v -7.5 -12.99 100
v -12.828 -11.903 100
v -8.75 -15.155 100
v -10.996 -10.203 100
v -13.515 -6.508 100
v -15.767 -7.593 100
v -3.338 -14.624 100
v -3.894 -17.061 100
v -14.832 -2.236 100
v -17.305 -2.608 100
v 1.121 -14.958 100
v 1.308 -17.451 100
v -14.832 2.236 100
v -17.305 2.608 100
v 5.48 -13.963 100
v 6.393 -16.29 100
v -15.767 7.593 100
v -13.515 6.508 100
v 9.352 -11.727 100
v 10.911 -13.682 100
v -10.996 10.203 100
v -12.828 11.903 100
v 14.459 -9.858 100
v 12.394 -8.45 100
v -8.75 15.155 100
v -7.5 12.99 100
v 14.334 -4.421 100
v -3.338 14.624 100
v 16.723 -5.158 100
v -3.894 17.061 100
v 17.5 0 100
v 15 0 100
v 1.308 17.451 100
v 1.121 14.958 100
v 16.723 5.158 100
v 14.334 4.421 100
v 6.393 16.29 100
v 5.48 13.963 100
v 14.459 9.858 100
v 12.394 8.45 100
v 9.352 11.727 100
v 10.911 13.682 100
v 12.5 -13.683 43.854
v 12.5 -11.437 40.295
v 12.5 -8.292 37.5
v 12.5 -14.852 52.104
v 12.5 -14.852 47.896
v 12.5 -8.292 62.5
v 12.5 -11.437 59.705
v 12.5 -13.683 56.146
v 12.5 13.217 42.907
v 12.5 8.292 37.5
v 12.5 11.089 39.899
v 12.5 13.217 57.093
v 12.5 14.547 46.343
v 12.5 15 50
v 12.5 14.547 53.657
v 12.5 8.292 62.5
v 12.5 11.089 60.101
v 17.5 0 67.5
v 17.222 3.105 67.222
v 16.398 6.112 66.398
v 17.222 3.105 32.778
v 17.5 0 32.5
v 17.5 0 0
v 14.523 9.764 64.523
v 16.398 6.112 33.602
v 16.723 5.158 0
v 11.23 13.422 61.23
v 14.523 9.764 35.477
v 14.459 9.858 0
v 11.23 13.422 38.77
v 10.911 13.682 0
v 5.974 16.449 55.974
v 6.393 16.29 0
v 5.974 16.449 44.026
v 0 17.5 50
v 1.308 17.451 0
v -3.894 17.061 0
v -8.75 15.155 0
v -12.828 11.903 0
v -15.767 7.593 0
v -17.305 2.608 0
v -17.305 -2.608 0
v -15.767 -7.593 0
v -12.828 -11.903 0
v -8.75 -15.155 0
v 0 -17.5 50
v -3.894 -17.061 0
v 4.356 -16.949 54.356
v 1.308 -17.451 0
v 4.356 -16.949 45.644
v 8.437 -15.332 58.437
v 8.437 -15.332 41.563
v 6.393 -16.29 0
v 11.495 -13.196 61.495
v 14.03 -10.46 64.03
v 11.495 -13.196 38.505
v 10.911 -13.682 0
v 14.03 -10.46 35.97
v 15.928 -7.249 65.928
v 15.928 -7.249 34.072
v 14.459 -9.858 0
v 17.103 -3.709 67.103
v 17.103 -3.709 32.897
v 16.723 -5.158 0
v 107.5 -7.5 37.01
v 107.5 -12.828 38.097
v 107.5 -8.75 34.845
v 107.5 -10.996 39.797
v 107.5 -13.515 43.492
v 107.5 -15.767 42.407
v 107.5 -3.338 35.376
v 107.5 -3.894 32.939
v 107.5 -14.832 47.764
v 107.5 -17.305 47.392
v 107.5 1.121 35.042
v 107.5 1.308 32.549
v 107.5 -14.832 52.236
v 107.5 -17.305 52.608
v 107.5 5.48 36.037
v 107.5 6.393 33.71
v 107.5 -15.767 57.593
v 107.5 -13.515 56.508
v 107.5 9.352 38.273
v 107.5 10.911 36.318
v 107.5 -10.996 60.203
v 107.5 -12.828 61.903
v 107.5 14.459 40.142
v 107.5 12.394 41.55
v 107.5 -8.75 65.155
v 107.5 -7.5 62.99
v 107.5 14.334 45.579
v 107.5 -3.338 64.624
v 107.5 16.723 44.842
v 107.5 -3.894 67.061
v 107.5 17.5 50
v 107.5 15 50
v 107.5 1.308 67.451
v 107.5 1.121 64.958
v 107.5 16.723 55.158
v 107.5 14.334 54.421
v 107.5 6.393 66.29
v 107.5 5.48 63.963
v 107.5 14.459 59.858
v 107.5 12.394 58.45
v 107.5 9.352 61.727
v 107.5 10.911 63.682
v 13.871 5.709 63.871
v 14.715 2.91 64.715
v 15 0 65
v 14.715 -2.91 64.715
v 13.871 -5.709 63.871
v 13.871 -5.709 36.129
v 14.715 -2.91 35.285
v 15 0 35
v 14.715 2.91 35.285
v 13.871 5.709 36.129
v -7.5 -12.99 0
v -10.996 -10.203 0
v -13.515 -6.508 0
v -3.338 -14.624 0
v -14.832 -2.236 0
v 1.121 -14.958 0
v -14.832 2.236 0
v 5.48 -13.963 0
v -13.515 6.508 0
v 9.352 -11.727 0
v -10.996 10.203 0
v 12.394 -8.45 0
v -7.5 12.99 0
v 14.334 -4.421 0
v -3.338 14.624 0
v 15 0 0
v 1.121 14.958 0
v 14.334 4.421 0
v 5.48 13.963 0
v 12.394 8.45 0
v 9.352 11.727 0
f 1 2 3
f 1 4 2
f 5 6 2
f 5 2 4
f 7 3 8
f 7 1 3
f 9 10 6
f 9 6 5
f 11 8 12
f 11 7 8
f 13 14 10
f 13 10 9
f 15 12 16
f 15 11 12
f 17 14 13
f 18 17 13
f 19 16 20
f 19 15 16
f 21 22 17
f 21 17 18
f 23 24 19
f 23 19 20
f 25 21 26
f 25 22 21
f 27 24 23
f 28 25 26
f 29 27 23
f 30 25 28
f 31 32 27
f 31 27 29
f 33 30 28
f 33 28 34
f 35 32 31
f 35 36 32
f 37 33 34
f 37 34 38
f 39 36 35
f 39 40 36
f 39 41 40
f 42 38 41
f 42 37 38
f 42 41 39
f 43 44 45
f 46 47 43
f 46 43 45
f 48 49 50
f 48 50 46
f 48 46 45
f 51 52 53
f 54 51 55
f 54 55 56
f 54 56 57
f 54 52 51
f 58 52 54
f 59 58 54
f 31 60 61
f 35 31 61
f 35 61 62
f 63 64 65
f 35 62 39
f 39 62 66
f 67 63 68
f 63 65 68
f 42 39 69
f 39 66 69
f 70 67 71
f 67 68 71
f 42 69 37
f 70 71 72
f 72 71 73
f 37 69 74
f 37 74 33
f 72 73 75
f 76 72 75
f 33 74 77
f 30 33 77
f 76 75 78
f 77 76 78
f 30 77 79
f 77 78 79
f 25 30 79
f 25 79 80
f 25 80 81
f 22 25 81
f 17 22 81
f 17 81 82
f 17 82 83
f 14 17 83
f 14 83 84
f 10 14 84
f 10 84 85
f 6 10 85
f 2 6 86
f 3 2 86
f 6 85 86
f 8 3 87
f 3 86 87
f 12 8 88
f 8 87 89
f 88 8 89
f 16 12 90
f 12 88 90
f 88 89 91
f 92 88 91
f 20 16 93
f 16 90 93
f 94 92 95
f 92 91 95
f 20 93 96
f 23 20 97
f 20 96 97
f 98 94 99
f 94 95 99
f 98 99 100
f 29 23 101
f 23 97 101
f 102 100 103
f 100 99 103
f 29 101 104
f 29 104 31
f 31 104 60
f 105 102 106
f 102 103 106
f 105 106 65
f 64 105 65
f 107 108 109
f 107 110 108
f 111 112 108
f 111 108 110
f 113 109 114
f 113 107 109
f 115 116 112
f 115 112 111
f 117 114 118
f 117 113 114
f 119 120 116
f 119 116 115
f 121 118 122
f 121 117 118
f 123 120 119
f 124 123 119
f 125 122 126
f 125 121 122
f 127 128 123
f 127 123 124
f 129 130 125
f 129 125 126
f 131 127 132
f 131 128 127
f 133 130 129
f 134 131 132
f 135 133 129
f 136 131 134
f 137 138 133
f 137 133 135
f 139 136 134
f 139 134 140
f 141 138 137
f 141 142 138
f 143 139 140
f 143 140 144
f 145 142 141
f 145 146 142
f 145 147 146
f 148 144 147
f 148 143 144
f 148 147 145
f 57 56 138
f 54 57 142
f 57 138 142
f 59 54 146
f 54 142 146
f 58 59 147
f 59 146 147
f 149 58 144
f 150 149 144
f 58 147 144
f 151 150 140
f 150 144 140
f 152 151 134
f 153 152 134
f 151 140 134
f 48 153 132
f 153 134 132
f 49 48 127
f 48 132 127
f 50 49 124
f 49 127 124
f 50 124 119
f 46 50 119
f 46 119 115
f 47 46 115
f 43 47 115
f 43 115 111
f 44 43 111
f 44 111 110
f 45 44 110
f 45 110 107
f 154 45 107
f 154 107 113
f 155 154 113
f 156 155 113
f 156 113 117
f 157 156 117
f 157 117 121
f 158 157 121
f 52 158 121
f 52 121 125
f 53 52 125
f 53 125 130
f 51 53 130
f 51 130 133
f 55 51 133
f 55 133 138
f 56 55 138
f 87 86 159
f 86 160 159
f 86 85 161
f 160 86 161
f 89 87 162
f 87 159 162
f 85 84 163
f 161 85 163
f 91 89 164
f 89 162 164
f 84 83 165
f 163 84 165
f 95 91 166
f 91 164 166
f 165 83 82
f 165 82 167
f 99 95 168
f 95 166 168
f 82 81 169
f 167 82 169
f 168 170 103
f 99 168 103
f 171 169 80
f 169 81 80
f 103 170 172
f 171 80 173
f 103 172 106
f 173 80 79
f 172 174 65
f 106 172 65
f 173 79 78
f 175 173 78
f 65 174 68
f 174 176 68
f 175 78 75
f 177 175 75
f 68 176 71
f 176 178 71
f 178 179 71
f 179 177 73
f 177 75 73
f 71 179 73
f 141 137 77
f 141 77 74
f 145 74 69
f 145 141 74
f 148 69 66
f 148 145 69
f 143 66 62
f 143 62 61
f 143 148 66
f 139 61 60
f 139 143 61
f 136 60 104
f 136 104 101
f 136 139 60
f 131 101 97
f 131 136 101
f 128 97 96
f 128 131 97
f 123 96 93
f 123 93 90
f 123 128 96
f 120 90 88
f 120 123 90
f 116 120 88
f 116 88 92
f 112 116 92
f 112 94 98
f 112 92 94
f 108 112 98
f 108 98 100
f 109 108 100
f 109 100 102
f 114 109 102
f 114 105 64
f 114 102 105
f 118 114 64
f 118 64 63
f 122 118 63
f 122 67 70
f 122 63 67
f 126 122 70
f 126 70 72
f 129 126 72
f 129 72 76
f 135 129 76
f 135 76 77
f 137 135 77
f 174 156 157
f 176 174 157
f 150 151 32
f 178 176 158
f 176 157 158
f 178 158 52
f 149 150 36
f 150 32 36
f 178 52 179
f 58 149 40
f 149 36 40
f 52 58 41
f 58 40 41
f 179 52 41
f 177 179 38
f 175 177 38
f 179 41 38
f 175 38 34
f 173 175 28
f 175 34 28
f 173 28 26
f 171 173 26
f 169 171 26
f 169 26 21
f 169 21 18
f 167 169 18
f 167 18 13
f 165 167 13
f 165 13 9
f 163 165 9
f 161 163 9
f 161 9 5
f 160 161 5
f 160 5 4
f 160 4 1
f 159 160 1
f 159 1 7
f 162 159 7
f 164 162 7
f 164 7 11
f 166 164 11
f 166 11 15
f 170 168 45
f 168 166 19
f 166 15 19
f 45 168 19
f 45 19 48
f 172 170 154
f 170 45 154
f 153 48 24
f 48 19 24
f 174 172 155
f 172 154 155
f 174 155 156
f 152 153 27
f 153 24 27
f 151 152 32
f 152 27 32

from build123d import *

# Parameters (mm, degrees)
F0_R     = 17.5
F1_DEPTH = 100
F3_R     = 17.5
F4_DEPTH = 107.5
F5_R     = 15
F7_DEPTH = 95
F6_R     = 15
F8_DEPTH = 100


with BuildPart() as f1:
    # F0 (on Top) → F1 (new body)
    with BuildSketch(Plane.XY):
        Circle(F0_R)
    extrude(amount=F1_DEPTH)

    # F3 (on offset) → F4 (join)
    with BuildSketch(Plane.YZ.offset(107.5)):
        with Locations((0, 50)):
            Circle(F3_R)
    extrude(amount=-F4_DEPTH)

    # F5 (on face) → F7 (cut)
    with BuildSketch(Plane.YZ.offset(107.5)):
        with Locations((0, 50)):
            Circle(F5_R)
    extrude(amount=-F7_DEPTH, mode=Mode.SUBTRACT)

    # F6 (on face) → F8 (cut, through all)
    with BuildSketch(Plane.XY.offset(100)):
        Circle(F6_R)
    extrude(amount=-F8_DEPTH, mode=Mode.SUBTRACT)


solid = f1.part
